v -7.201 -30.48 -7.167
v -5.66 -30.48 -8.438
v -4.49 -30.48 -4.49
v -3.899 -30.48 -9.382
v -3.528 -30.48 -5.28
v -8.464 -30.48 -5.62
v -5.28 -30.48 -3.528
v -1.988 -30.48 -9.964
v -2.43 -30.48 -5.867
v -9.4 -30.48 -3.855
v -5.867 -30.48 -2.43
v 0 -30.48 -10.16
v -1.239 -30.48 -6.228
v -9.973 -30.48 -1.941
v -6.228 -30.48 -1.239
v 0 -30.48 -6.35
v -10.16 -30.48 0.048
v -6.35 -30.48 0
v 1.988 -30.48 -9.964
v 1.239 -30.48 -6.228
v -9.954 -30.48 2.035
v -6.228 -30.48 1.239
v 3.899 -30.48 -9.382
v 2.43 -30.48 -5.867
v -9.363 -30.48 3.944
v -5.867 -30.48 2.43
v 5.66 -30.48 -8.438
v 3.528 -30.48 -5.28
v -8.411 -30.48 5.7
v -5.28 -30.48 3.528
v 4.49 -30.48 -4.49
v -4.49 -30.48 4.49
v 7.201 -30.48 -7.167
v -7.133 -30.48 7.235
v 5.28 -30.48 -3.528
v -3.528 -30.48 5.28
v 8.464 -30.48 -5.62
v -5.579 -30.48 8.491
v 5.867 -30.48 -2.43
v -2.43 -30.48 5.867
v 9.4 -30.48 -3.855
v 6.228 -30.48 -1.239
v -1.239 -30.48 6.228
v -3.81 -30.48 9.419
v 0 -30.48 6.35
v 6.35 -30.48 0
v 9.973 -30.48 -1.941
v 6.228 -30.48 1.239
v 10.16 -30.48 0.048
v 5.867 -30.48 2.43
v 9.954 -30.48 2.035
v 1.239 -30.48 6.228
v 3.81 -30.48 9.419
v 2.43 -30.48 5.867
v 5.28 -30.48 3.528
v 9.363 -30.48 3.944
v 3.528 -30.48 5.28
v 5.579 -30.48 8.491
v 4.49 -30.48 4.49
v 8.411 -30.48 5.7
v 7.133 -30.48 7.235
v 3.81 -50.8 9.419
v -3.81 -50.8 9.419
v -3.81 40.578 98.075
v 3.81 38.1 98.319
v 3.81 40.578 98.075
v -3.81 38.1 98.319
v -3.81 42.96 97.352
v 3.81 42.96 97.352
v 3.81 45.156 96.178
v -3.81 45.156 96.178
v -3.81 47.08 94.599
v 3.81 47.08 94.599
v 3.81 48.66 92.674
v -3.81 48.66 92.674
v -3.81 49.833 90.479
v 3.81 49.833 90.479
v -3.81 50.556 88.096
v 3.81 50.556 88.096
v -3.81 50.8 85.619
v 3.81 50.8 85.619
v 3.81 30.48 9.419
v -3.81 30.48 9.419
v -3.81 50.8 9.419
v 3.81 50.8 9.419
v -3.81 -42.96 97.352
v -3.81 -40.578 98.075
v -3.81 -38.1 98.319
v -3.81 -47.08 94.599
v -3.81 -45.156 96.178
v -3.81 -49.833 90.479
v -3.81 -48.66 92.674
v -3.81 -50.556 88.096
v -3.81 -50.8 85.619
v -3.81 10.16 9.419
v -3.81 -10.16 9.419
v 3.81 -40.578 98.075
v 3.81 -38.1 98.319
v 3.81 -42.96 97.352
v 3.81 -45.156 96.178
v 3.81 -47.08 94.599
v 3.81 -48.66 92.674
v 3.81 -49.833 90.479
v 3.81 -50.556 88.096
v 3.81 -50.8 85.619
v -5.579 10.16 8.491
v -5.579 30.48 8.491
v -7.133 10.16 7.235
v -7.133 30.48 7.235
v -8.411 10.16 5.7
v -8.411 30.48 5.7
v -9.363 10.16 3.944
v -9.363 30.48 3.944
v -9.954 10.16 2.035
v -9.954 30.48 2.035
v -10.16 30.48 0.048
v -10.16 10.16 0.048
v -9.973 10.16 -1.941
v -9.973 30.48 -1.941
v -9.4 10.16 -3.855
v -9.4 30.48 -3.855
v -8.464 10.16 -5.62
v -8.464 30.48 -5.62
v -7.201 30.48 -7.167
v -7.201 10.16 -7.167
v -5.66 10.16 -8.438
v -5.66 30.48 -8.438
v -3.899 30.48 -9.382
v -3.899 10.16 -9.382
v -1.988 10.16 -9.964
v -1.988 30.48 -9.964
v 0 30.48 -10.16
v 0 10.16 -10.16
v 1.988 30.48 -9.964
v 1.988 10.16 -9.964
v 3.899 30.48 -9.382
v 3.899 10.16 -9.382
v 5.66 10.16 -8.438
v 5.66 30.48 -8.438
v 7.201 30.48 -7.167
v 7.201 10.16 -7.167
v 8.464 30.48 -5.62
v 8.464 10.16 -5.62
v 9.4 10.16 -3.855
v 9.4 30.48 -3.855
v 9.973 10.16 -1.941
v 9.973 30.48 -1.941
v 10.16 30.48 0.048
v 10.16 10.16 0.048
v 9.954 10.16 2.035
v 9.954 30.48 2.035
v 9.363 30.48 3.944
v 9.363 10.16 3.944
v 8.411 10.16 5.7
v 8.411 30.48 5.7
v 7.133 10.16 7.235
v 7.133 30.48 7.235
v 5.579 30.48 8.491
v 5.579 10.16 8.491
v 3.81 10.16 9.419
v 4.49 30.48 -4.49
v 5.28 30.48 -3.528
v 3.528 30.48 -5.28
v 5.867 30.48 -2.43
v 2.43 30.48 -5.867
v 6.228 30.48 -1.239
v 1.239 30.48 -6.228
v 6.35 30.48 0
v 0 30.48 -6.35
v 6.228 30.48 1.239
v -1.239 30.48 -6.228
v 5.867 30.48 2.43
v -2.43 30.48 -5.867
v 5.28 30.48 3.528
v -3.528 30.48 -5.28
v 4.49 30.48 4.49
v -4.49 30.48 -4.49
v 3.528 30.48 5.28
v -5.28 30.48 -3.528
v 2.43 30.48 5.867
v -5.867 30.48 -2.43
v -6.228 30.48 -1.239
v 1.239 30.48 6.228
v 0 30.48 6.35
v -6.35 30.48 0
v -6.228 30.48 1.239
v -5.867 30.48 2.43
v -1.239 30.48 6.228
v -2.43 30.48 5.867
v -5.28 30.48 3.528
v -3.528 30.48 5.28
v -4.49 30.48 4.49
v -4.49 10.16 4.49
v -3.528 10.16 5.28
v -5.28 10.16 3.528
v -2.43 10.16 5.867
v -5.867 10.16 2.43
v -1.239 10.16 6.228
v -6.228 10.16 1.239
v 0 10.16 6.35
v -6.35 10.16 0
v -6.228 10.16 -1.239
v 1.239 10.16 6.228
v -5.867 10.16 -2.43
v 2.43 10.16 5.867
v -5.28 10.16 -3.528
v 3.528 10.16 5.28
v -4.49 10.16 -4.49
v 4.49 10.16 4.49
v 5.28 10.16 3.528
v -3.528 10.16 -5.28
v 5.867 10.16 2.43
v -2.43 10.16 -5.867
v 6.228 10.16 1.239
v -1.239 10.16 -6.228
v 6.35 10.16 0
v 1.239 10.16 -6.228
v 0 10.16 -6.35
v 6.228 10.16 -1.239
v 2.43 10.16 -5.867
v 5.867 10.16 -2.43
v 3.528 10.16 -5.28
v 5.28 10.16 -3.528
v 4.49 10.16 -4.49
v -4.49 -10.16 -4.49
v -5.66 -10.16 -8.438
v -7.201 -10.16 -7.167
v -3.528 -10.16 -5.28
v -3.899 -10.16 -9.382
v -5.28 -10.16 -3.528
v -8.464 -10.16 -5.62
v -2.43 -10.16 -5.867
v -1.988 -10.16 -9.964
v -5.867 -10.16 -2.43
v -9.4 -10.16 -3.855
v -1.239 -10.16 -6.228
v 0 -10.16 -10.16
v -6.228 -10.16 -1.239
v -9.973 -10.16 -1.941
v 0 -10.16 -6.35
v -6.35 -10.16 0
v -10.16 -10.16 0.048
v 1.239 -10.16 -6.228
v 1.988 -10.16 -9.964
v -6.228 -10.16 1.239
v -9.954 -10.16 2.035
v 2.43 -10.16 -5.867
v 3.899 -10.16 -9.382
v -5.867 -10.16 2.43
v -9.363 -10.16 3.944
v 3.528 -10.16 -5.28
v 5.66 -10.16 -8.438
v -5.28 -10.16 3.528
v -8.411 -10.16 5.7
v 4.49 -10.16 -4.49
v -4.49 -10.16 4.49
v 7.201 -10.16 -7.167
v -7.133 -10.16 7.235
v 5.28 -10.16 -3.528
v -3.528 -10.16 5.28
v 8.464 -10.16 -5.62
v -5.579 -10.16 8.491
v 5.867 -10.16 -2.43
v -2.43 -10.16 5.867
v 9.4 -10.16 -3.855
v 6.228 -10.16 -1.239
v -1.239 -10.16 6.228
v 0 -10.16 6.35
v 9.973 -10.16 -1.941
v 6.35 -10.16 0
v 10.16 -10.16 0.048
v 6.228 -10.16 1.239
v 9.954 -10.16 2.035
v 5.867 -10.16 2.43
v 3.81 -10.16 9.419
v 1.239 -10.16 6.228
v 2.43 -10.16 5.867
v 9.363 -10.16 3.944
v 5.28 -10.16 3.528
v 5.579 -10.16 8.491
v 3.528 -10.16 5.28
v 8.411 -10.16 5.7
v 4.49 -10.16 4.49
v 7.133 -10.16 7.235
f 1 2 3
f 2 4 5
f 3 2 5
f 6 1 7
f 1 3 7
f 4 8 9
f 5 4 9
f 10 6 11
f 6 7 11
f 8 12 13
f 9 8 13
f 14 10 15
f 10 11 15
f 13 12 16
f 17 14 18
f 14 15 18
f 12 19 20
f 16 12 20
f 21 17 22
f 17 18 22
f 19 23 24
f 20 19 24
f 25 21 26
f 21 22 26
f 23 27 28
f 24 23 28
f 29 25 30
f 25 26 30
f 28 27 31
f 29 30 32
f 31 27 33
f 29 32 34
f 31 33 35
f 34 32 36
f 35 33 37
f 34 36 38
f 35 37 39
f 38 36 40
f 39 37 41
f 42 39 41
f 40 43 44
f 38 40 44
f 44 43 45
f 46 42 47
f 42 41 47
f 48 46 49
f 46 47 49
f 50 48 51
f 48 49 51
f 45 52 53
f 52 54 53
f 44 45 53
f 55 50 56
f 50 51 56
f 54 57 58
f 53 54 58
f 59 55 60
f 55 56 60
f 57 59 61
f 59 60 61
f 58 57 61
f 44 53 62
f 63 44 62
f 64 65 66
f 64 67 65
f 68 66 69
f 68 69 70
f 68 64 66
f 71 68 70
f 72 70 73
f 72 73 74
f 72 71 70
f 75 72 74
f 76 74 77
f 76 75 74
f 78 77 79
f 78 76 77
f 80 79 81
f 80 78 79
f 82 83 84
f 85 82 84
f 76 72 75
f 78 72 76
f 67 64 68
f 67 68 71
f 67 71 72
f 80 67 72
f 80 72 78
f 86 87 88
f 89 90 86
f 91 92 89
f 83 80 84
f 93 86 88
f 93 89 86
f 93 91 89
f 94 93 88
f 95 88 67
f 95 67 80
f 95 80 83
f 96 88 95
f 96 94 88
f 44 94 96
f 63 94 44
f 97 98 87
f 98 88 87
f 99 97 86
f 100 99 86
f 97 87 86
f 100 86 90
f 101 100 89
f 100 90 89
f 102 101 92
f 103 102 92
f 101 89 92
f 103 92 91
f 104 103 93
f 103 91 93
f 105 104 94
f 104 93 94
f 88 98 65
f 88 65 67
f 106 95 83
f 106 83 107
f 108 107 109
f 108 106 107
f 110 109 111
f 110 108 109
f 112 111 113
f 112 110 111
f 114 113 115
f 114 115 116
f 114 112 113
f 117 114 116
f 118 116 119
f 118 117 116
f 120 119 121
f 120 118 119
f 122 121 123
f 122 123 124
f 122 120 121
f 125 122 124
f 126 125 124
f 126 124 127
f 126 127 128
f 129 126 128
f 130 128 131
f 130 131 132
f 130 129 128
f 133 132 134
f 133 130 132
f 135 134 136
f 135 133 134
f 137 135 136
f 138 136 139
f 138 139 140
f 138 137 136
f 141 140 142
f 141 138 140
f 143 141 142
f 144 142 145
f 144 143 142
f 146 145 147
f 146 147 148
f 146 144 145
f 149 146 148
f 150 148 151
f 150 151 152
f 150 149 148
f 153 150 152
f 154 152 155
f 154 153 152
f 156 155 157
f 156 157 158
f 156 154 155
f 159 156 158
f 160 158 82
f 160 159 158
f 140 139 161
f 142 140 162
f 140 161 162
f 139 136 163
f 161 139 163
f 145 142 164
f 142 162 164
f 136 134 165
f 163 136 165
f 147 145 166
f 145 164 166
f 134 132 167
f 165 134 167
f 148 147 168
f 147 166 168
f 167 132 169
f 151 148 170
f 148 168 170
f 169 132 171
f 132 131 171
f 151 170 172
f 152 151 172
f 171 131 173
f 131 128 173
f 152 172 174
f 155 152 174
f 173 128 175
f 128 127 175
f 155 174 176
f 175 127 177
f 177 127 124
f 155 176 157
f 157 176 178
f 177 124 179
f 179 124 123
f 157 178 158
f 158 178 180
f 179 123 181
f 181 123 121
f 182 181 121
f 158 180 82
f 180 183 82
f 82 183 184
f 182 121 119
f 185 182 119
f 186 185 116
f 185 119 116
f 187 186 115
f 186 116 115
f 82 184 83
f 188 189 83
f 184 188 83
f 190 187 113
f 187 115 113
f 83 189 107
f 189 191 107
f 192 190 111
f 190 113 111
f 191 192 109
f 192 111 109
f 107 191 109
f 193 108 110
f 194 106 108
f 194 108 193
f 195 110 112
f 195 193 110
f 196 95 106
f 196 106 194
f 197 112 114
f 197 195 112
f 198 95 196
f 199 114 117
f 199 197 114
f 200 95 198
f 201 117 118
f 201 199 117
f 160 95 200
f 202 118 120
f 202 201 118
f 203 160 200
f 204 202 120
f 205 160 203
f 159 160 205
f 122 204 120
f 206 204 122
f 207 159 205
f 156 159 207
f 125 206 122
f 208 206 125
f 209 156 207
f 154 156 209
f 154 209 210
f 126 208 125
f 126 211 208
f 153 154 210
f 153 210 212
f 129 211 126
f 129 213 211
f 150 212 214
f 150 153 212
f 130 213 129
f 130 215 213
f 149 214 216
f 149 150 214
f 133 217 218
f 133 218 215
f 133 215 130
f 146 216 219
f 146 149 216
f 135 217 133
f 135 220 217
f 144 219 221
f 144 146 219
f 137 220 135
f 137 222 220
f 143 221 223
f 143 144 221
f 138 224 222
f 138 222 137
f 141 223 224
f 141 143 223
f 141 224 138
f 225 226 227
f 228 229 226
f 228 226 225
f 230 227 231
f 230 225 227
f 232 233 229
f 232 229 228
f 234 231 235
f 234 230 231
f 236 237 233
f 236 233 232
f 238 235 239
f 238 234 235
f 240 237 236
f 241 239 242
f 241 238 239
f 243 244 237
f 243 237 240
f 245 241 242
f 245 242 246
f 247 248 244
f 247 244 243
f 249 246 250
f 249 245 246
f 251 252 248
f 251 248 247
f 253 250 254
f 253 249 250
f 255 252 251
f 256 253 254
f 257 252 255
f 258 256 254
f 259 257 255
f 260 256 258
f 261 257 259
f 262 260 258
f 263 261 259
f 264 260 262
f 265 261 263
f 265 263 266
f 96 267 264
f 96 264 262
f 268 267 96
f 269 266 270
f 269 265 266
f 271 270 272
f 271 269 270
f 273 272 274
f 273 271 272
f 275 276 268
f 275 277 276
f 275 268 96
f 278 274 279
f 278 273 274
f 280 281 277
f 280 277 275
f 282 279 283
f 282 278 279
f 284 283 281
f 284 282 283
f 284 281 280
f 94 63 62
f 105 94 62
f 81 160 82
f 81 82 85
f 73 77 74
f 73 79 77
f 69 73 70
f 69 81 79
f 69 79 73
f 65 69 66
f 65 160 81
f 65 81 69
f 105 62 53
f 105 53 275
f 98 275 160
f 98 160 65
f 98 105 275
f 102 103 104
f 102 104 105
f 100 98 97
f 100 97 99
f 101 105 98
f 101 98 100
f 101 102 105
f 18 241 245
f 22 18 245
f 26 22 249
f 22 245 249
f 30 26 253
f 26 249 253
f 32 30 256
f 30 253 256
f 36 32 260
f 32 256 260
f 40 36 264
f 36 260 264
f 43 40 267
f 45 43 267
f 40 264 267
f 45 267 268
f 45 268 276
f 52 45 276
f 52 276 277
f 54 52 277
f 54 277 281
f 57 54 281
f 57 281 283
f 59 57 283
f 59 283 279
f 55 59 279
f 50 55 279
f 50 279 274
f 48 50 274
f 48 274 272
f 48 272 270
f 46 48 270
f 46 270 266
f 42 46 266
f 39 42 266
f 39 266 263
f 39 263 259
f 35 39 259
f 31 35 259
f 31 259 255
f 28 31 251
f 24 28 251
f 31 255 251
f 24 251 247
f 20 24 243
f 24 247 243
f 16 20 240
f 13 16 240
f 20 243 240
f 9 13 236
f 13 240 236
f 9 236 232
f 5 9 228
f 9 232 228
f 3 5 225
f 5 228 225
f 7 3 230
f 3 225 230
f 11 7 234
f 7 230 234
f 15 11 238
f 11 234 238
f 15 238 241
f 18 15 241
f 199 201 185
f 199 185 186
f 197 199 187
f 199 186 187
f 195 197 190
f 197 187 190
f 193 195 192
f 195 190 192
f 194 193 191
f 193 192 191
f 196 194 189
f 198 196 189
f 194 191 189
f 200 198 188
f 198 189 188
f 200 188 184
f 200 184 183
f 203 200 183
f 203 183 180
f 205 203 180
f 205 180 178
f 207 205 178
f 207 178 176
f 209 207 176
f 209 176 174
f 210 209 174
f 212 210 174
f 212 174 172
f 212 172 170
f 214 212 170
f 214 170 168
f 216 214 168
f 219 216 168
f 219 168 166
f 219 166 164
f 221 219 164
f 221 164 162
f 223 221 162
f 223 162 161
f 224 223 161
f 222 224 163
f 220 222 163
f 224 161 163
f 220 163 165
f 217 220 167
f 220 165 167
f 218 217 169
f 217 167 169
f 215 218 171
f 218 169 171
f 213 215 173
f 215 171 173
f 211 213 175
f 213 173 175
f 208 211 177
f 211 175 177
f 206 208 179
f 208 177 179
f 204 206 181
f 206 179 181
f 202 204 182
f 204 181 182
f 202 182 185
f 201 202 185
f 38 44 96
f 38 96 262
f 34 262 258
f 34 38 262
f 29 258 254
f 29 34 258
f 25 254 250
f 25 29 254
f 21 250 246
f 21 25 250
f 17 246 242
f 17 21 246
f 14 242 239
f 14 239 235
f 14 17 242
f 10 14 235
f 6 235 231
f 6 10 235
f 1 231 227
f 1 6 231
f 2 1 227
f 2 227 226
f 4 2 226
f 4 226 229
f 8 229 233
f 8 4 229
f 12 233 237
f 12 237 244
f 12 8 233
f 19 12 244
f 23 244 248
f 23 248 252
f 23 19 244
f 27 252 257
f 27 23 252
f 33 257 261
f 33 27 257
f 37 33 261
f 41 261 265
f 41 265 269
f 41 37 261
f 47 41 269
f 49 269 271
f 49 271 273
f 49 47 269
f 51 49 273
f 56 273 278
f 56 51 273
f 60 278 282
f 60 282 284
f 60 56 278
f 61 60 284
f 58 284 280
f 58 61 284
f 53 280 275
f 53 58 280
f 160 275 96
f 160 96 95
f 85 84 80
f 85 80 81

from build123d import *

# Parameters (mm, degrees)
F1_DEPTH = 50.8
F2_R     = 12.7
F3_R     = 6.35
F4_DEPTH = 101.601
F5_W     = 20.32
F5_H     = 38.1
F6_DEPTH = 88.9


with BuildPart() as f1:
    # F0 (on Front) → F1 (new body, symmetric)
    with BuildSketch(Plane.XZ):
        with BuildLine():
            Line((-3.81, 98.3185720786), (-3.81, 9.4185720786))
            ThreePointArc((-3.81, 9.4185720786), (0, -10.16), (3.81, 9.4185720786))
            Line((3.81, 9.4185720786), (3.81, 98.3185720786))
            Line((3.81, 98.3185720786), (-3.81, 98.3185720786))
        make_face()
    extrude(amount=F1_DEPTH, both=True)

    # F2
    f2_edges = [f1.edges().sort_by_distance(p)[0] for p in [
        (0, -50.8, 98.318572),
        (0, 50.8, 98.318572),
    ]]
    fillet(f2_edges, radius=F2_R)

    # F3 (on face) → F4 (cut, through all)
    with BuildSketch(Plane(origin=(0, 50.8, 0), x_dir=(-1, 0, 0), z_dir=(0, 1, 0))):
        Circle(F3_R)
    extrude(amount=-F4_DEPTH, mode=Mode.SUBTRACT)

    # F5 (on face) → F6 (cut, symmetric)
    with BuildSketch(Plane(origin=(-3.81, 0, 0), x_dir=(0, -1, 0), z_dir=(-1, 0, 0))):
        with Locations((40.64, -9.6314279214)):
            Rectangle(F5_W, F5_H)
        Polygon((10.16, 9.4185720786), (-10.16, 9.4185720786), (-10.16, -20.9424663335), (-10.16, -22.940389812), (10.16, -22.940389812), align=None)
        Polygon((-30.48, 9.4185720786), (-50.8, 9.4185720786), (-50.8, -9.6314279214), (-50.8, -22.1083164215), (-30.48, -22.1083164215), align=None)
    extrude(amount=F6_DEPTH, both=True, mode=Mode.SUBTRACT)


solid = f1.part
